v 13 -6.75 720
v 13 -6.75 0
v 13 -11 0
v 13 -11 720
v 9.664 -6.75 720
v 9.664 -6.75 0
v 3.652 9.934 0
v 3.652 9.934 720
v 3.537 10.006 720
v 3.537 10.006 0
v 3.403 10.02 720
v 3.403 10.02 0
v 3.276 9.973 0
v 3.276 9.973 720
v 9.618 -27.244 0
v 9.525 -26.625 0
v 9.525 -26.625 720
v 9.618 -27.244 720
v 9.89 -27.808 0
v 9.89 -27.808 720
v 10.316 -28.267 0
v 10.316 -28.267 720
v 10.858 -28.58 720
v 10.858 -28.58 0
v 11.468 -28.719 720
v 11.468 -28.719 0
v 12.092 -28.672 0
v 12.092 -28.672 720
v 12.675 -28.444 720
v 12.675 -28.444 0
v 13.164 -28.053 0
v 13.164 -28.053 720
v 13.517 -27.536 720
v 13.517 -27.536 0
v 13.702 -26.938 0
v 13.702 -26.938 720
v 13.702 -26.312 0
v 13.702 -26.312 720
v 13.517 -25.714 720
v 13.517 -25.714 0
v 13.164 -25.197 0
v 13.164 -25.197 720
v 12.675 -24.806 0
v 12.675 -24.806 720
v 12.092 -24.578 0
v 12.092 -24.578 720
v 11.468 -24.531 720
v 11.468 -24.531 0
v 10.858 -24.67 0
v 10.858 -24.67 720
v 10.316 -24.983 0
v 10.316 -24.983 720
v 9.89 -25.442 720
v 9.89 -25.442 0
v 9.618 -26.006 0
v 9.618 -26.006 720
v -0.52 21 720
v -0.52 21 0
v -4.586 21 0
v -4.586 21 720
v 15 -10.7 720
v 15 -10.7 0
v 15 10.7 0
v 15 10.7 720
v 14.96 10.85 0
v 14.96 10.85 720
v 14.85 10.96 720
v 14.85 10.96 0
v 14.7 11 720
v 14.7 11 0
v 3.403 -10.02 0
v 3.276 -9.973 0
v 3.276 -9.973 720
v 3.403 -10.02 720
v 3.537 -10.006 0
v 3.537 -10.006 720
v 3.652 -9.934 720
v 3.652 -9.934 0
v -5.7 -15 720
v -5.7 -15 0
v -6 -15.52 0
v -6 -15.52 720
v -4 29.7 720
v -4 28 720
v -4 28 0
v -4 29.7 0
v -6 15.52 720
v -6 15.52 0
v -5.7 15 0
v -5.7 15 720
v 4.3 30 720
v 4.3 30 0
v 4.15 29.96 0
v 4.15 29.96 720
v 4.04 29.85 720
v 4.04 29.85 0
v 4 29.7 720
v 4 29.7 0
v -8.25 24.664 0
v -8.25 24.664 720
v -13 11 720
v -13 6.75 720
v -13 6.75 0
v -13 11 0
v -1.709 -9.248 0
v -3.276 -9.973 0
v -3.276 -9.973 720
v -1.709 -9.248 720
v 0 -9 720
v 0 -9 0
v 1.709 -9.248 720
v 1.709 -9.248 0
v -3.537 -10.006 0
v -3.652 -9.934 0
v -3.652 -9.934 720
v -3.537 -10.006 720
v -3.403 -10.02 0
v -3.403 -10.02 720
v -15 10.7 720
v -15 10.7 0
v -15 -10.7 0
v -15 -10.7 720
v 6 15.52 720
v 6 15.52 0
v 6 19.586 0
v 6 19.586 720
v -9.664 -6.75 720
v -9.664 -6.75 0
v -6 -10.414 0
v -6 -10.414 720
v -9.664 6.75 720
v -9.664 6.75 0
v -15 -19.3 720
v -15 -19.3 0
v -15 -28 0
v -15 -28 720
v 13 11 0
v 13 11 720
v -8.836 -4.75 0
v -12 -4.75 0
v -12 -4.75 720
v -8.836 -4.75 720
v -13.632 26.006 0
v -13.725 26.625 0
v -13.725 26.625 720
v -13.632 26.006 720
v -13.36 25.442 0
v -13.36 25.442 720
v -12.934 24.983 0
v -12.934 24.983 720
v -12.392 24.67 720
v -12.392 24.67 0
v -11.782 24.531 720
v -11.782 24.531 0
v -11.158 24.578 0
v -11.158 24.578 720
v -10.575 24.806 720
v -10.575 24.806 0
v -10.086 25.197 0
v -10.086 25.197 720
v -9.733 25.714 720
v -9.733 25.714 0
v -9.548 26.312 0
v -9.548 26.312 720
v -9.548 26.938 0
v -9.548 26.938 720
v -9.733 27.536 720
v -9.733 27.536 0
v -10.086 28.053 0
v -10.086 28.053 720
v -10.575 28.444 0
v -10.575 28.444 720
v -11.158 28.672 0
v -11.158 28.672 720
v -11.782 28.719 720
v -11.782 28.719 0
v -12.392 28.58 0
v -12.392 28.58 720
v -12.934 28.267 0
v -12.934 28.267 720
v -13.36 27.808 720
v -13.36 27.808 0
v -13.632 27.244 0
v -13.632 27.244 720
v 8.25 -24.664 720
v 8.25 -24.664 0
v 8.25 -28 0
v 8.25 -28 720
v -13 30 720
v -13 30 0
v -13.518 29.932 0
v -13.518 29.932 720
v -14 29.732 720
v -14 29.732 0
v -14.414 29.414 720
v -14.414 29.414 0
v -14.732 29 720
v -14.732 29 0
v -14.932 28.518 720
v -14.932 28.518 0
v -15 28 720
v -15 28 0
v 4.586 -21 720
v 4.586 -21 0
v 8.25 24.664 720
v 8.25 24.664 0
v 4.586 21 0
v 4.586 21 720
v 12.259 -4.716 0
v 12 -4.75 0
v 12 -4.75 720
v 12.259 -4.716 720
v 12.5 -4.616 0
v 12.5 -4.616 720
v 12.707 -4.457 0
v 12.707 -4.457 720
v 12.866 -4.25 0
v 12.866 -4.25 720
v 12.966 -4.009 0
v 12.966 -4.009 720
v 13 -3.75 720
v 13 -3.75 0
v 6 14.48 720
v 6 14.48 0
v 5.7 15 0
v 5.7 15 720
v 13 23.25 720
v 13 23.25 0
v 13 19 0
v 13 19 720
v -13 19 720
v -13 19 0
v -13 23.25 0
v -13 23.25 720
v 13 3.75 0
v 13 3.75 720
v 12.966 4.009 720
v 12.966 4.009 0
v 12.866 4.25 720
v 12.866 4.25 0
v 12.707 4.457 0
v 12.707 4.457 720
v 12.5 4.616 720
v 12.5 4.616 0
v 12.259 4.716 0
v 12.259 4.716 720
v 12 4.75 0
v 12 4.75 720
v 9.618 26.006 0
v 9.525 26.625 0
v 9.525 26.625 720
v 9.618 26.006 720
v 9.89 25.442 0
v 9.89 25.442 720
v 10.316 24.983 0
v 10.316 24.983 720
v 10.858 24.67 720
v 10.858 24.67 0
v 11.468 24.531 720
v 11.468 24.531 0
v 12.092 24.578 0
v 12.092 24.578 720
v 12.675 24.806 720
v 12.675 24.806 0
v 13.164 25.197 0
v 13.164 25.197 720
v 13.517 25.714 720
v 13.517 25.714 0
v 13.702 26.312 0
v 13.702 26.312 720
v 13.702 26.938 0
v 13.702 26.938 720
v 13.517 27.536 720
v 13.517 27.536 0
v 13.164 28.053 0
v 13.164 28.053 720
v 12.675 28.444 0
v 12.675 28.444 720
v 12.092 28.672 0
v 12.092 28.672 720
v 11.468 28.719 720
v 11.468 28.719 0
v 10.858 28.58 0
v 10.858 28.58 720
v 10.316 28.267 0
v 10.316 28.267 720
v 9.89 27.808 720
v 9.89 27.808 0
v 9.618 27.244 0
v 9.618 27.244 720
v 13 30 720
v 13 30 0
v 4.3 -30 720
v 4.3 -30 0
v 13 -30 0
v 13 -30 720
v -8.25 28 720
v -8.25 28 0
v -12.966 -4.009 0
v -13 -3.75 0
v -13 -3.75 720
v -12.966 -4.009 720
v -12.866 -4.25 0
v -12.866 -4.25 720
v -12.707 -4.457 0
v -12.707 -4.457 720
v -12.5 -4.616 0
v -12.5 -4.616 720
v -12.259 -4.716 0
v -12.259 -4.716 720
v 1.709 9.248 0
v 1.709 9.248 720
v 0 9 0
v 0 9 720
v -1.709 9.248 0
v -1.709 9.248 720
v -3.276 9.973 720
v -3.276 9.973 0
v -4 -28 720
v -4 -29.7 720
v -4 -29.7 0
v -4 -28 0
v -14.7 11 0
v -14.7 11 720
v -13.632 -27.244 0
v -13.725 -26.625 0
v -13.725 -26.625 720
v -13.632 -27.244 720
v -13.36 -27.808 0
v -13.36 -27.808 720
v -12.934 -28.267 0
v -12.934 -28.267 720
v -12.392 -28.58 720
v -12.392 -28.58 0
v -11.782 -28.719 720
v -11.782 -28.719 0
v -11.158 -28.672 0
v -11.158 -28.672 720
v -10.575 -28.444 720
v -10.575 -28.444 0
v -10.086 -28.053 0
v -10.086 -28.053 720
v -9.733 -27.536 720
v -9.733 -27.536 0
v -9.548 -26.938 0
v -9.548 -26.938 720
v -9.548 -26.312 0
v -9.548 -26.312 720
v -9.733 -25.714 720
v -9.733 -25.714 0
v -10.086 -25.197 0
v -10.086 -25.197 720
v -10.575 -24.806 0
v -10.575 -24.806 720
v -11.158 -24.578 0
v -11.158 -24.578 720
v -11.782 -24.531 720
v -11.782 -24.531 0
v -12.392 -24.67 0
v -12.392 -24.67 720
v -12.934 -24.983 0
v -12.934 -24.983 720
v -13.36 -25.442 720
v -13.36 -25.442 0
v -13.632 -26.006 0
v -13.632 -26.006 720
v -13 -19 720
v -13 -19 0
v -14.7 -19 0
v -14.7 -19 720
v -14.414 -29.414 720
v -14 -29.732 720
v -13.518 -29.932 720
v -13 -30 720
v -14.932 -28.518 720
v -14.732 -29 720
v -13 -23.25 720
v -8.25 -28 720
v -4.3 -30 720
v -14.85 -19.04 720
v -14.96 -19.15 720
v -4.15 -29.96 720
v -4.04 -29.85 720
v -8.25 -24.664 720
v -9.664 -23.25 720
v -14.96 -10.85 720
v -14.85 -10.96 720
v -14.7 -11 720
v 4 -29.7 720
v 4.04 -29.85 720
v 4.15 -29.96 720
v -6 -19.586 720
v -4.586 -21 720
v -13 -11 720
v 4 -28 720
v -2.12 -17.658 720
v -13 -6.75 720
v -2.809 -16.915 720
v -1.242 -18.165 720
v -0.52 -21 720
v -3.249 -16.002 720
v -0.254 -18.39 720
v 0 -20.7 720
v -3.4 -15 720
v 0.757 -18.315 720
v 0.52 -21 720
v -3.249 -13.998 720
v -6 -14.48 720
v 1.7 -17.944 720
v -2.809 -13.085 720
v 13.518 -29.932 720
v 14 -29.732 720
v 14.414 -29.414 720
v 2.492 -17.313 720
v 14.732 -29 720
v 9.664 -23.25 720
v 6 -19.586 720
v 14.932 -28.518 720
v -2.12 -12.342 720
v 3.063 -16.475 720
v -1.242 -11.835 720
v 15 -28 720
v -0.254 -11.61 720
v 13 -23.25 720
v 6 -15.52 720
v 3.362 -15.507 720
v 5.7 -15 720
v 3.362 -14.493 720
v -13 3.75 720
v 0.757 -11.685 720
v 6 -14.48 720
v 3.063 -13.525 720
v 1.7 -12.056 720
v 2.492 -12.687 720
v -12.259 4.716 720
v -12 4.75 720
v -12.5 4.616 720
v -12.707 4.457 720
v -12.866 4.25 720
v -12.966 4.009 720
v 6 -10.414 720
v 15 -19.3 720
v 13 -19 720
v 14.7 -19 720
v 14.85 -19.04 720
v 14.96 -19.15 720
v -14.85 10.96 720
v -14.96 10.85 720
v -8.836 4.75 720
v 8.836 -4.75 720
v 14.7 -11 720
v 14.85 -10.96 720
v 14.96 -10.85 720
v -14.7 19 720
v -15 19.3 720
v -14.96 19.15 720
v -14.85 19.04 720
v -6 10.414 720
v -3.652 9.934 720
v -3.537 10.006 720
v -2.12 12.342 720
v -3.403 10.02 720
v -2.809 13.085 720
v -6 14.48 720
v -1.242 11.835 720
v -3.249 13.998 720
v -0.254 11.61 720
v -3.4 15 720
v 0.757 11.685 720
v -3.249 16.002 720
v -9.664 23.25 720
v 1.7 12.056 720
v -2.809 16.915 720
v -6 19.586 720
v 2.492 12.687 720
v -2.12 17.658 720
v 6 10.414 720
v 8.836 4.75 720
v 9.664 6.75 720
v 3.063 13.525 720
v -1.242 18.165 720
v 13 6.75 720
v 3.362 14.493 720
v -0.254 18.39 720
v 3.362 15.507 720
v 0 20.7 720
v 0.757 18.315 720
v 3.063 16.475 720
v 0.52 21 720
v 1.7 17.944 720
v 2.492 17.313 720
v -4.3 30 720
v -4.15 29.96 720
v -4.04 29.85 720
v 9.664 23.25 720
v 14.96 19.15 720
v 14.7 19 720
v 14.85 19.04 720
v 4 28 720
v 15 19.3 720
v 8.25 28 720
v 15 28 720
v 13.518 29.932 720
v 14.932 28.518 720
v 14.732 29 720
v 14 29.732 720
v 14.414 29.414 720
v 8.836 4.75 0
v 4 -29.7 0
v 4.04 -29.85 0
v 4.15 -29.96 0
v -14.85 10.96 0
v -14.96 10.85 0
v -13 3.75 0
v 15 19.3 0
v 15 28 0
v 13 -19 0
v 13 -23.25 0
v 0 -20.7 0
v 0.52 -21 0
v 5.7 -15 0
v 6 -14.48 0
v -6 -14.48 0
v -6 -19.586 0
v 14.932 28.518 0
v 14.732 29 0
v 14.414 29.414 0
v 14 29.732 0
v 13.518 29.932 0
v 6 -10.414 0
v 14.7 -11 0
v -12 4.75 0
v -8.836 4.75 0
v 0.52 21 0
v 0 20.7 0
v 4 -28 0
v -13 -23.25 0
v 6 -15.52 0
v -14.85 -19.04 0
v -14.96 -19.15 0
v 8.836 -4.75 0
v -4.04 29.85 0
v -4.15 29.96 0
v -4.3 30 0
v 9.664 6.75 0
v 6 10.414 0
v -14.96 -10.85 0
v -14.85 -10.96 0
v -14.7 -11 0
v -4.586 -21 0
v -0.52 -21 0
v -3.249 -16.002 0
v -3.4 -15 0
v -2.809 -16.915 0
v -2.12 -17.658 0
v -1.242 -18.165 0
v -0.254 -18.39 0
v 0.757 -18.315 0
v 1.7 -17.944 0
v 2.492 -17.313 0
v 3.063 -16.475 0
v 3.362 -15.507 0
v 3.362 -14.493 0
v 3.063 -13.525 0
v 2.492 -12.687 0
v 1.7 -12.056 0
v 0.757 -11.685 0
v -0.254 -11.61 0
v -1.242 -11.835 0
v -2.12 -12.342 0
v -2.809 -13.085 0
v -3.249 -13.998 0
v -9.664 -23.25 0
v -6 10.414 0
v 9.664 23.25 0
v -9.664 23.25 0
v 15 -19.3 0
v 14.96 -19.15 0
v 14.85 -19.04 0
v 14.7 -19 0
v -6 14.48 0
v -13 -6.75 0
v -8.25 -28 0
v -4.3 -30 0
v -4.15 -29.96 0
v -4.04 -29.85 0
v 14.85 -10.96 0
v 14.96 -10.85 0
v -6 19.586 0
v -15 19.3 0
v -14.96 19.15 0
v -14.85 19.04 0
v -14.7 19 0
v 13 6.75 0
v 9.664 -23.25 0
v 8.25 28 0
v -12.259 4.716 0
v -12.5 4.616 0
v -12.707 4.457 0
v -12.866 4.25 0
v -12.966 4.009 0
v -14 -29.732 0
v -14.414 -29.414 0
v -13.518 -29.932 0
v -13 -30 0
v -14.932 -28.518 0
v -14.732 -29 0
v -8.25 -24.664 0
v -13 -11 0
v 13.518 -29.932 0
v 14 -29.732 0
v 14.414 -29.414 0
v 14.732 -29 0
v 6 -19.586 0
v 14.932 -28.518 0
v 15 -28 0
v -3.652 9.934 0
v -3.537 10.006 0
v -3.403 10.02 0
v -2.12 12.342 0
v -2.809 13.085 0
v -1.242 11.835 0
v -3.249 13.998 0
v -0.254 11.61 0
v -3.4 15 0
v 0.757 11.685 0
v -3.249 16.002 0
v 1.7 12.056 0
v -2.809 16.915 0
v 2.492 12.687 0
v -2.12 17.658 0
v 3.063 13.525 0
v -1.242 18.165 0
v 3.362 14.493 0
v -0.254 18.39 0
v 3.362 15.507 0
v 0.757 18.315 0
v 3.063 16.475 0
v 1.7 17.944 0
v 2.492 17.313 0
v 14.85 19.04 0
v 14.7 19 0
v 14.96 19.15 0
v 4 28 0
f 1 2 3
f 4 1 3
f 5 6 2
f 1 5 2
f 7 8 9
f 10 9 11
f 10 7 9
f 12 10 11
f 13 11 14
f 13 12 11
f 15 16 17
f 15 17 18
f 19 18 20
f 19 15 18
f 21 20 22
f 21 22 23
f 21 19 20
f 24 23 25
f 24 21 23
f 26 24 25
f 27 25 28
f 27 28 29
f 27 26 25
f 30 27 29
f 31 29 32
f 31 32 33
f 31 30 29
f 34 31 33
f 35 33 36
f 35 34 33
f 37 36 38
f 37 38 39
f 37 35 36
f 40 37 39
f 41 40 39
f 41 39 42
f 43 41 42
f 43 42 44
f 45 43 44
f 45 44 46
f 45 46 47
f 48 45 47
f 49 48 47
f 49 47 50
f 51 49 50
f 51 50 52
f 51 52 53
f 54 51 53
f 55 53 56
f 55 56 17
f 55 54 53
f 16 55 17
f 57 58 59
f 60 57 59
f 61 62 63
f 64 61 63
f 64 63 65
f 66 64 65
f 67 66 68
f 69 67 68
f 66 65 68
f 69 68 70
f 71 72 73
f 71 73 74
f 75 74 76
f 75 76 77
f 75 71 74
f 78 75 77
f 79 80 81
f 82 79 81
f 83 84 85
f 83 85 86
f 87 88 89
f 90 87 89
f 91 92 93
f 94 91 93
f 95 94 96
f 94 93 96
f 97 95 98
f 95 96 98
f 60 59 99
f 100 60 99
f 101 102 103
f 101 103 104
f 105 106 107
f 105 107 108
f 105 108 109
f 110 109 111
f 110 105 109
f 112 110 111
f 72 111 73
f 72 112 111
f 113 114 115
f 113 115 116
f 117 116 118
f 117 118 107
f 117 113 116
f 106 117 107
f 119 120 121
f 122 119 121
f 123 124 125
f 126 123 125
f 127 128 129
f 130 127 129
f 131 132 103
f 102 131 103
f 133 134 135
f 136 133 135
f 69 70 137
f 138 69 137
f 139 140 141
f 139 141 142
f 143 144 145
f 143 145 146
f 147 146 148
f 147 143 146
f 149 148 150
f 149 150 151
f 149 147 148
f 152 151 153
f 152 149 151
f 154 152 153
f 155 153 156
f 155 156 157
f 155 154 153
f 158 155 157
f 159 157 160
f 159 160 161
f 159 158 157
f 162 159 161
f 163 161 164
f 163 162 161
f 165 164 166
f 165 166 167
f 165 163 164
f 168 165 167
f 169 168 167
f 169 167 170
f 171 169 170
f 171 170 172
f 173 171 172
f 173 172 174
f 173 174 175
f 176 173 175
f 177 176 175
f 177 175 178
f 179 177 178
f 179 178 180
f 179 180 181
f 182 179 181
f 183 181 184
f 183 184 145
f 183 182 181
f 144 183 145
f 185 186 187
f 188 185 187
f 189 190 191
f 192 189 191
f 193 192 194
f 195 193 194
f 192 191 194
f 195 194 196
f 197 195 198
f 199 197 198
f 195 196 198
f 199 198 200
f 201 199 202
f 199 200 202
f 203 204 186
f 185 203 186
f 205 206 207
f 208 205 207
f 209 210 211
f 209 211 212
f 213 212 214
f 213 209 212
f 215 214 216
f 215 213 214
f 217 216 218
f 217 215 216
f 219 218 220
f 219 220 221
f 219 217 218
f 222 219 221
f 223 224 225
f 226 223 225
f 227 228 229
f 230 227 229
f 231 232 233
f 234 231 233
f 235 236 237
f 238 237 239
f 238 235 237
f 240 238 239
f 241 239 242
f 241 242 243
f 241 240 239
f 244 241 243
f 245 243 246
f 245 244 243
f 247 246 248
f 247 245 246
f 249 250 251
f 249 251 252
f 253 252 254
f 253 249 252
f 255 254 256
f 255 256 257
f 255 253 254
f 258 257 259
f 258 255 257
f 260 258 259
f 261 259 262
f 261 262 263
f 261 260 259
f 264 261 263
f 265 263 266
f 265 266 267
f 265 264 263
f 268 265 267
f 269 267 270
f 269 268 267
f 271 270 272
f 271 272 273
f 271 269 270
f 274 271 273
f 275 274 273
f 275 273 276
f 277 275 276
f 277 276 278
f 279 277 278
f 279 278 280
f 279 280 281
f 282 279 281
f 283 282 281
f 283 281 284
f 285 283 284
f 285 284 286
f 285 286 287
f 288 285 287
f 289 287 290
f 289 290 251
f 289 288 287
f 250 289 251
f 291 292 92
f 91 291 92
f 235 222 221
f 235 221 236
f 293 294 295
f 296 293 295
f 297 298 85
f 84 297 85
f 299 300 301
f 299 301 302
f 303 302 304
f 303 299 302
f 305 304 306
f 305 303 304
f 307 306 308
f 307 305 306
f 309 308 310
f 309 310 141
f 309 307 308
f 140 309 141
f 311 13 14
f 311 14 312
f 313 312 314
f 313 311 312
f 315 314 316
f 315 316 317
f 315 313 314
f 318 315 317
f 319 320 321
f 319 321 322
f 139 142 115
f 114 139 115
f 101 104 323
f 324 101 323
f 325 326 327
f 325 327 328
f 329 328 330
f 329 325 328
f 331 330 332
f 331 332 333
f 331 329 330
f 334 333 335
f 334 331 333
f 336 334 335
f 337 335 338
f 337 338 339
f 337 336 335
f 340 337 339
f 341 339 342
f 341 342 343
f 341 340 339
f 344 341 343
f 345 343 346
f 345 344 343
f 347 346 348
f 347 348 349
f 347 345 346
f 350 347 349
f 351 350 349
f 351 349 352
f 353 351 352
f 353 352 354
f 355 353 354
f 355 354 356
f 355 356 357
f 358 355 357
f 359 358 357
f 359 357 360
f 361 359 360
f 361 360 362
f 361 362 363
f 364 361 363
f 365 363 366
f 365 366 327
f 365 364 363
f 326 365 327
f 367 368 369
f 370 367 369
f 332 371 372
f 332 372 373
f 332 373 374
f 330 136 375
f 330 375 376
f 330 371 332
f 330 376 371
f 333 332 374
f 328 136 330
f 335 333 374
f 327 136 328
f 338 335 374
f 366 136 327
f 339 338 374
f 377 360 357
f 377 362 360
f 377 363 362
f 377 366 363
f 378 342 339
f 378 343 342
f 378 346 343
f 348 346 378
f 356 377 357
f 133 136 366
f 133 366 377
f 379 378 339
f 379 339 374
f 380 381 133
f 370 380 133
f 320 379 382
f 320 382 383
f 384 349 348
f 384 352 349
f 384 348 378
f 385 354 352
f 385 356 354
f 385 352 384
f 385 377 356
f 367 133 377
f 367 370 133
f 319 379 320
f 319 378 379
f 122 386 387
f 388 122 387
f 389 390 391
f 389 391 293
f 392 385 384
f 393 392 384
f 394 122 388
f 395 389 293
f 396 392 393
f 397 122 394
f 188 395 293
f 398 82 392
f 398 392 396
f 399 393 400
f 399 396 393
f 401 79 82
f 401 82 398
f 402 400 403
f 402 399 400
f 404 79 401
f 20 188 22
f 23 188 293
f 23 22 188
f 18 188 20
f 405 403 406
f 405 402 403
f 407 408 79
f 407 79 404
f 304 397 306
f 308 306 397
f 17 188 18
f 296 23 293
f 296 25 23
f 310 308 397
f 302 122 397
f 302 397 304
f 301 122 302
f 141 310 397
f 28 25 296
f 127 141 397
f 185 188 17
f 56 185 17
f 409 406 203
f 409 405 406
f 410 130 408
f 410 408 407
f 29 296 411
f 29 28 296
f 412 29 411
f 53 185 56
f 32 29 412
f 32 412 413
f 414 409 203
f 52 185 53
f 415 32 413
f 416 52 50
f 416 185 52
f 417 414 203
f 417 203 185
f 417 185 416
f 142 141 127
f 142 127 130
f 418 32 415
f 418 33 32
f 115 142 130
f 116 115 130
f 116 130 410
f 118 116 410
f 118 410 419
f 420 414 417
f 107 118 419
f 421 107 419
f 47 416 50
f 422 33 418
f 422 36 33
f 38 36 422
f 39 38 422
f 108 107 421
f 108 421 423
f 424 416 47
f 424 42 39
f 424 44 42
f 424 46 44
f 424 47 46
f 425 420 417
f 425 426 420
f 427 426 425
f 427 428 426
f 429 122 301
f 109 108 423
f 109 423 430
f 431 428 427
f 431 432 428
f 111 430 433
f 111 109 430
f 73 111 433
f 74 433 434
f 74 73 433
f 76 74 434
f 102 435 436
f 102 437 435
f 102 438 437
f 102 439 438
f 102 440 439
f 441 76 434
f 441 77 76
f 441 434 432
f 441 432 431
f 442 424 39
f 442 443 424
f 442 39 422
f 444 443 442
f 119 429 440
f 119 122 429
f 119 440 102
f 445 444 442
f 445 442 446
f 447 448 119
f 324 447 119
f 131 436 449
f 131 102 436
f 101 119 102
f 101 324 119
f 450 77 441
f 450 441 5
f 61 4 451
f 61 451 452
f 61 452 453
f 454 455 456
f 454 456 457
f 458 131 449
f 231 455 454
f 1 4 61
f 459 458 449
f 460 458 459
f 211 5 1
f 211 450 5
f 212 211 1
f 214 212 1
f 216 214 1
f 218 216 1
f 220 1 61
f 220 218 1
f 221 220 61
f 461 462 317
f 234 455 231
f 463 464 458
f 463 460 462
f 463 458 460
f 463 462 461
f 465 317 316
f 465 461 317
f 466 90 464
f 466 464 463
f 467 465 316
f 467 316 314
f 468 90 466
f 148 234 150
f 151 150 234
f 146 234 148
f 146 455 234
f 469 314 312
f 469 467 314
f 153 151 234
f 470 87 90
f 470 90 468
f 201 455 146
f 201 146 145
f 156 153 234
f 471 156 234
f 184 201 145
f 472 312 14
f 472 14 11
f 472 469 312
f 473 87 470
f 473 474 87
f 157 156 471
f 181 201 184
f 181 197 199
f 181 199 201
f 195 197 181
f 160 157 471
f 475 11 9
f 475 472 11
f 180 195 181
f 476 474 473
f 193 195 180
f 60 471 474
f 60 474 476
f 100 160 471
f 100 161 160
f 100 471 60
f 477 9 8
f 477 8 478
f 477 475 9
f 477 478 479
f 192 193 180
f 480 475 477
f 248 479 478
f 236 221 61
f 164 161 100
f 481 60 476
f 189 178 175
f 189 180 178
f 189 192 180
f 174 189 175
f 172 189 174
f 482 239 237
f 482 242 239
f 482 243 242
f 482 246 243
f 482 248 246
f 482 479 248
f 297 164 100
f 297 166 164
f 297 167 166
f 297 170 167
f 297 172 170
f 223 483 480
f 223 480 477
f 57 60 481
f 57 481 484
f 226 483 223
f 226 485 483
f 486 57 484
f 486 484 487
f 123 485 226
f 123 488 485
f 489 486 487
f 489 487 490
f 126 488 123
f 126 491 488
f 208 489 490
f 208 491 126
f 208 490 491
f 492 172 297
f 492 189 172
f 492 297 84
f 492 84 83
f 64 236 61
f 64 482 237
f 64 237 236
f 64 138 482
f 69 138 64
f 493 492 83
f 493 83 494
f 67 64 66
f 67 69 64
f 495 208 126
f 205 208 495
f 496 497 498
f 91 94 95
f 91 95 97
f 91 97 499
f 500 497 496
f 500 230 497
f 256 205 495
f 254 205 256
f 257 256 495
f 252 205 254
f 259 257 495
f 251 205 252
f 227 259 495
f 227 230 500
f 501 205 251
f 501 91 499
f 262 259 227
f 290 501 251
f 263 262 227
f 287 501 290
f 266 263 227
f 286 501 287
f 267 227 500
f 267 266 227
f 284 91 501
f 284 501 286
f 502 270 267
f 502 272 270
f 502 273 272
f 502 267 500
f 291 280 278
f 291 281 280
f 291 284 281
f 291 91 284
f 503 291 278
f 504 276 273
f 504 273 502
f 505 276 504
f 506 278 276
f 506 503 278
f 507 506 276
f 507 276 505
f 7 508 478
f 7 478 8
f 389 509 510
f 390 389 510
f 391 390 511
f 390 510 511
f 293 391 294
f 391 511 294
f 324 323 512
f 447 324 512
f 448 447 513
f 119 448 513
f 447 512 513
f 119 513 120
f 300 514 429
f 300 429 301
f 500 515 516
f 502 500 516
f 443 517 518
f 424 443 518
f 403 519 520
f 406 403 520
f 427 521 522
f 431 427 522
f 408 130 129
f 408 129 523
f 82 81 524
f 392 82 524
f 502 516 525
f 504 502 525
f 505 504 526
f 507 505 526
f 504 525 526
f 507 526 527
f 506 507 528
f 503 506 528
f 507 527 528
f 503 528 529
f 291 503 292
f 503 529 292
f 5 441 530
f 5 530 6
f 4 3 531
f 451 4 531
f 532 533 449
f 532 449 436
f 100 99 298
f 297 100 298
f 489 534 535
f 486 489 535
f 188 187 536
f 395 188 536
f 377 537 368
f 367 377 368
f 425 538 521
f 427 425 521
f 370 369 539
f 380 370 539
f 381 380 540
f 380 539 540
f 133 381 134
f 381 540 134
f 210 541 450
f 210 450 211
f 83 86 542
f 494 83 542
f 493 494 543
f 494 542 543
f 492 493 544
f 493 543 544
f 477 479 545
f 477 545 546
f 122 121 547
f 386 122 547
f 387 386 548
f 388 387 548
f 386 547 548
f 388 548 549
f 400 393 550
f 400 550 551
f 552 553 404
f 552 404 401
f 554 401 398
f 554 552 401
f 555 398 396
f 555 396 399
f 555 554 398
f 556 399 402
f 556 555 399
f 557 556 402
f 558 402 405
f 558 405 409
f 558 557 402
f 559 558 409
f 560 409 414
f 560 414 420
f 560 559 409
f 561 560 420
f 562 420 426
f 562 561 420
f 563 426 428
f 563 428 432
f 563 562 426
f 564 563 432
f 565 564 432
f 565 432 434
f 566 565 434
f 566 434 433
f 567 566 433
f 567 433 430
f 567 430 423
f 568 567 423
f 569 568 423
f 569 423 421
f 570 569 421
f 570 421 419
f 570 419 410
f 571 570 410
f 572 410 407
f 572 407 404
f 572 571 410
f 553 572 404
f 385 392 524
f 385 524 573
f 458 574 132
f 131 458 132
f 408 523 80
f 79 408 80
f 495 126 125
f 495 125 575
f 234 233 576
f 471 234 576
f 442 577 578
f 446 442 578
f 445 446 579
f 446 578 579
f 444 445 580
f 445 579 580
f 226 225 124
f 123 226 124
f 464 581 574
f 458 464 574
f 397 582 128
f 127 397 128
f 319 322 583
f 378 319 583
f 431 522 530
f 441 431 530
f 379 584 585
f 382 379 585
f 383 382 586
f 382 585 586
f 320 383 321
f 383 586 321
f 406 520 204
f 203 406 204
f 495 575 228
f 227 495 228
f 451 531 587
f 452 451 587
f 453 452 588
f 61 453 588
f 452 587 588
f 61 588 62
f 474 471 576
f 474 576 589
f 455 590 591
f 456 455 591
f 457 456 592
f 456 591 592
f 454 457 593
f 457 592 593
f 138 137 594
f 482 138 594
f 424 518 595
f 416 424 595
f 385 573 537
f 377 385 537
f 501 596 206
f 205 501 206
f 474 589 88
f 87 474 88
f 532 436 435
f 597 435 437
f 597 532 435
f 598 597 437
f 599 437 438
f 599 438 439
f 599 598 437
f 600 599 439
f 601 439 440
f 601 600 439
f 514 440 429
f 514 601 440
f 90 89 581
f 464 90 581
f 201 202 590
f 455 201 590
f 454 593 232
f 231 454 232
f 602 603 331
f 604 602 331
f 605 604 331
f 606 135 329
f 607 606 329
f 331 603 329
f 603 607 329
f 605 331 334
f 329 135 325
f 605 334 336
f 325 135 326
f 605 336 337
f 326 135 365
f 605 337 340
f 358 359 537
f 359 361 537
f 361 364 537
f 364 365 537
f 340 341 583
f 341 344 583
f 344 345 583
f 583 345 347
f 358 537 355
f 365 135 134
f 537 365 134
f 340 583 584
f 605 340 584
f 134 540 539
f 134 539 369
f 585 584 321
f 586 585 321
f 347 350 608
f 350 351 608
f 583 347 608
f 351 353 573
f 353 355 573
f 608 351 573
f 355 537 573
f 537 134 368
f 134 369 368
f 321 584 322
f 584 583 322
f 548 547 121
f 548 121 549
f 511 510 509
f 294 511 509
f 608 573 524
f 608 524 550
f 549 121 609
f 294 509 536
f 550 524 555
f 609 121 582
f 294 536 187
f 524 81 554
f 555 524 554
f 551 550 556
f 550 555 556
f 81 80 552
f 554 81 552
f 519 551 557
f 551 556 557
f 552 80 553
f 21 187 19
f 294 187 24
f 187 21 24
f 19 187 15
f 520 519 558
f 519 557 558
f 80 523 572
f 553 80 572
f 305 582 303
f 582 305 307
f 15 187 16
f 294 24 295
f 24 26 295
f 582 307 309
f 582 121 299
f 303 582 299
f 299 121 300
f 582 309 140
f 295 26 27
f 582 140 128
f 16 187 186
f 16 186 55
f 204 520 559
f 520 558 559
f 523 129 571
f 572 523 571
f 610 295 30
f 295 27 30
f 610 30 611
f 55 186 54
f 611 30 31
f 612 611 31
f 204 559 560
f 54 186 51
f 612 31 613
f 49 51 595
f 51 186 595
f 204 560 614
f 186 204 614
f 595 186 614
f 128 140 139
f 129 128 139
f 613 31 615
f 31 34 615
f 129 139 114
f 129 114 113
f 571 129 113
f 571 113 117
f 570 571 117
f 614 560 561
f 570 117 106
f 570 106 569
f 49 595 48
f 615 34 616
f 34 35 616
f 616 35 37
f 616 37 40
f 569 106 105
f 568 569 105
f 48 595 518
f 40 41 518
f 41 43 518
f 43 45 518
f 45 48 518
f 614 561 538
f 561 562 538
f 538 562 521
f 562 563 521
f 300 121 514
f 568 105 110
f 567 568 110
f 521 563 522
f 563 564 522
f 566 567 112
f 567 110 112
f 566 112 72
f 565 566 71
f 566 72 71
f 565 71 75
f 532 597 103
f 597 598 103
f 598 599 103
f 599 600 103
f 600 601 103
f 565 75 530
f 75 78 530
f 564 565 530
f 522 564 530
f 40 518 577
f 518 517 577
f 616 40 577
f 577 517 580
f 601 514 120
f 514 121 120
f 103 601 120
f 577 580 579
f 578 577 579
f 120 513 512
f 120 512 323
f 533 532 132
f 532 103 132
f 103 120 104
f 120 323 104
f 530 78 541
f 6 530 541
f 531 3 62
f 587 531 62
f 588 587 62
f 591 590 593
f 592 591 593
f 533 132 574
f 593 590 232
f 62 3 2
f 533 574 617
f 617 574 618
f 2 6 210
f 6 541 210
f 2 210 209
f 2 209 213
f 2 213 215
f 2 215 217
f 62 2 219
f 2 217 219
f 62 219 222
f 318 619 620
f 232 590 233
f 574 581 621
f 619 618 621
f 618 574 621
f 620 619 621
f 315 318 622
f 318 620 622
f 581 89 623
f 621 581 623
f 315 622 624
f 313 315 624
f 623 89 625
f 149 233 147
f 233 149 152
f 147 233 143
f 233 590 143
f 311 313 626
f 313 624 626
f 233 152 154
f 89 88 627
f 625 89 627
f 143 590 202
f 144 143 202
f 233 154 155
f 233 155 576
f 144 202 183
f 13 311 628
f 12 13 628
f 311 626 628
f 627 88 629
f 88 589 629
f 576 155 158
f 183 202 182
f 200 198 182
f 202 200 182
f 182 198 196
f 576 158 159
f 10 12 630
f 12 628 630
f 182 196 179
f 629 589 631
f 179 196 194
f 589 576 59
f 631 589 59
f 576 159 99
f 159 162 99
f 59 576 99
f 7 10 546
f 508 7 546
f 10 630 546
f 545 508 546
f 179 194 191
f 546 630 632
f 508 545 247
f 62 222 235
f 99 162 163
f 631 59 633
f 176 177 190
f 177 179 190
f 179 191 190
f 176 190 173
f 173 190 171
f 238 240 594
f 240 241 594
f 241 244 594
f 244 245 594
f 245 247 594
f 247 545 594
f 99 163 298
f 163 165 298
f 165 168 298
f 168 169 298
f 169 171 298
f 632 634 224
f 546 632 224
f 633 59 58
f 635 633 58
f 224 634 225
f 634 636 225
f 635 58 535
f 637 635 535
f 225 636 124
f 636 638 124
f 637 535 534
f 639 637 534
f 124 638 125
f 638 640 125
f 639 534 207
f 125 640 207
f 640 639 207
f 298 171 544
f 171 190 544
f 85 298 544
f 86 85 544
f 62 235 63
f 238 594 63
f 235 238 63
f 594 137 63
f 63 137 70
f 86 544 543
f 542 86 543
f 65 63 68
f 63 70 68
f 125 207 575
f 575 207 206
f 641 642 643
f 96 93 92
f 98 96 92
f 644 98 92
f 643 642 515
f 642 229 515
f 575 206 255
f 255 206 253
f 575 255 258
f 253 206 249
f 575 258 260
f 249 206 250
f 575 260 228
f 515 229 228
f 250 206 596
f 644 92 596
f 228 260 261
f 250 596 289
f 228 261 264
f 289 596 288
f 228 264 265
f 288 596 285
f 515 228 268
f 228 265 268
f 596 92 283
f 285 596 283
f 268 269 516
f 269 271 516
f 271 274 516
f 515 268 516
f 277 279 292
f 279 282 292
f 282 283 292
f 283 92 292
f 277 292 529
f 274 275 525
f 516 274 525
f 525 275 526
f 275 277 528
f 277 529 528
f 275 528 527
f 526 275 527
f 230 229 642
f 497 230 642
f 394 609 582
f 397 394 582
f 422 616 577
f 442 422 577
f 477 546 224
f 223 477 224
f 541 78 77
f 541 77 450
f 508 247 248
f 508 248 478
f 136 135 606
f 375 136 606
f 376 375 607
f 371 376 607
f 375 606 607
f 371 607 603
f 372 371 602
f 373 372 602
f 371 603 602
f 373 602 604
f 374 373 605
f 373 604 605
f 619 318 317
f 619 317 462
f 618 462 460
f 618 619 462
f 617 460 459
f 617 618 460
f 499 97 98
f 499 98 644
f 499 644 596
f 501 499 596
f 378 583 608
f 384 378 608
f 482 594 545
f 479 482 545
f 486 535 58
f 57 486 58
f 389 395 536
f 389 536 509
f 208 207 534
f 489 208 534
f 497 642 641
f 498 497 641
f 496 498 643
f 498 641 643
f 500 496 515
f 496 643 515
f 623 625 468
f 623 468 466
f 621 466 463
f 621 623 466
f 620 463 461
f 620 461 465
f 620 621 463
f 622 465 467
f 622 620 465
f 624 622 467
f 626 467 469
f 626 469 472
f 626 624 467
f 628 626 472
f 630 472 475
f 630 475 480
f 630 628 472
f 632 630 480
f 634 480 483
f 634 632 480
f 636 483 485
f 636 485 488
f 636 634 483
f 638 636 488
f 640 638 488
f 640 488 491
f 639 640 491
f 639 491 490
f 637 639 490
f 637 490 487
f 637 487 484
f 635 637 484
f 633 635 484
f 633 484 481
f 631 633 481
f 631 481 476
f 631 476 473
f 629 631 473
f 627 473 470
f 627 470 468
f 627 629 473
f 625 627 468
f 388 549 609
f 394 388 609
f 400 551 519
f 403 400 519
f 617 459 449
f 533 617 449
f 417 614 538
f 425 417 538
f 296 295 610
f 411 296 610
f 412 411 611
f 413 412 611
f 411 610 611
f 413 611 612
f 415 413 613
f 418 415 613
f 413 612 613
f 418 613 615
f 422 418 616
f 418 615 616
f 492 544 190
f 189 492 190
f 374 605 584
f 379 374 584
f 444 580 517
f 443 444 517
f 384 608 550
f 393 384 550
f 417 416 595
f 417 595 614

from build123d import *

# Parameters (mm, degrees)
SKETCH2_R           = 2.1
SKETCH2_R_2         = 3.4
BOSS_EXTRUDE1_DEPTH = 720


with BuildPart() as part:
    # Sketch2 → Boss-Extrude1 (new body)
    with BuildSketch(Plane.XY):
        with BuildLine():
            Line((-13, -30), (-4.3, -30))
            ThreePointArc((-4.3, -30), (-4.087867966, -29.912132034), (-4, -29.7))
            Line((-4, -29.7), (-4, -28))
            Line((-4, -28), (-8.249999995, -28))
            Line((-8.249999995, -28), (-8.249999995, -24.664213567))
            Line((-8.249999995, -24.664213567), (-4.585786428, -21))
            Line((-4.585786428, -21), (-0.519615237, -21))
            Line((-0.519615237, -21), (5e-09, -20.7))
            Line((5e-09, -20.7), (0.519615247, -21))
            Line((0.519615247, -21), (4.585786438, -21))
            Line((4.585786438, -21), (8.250000005, -24.664213567))
            Line((8.250000005, -24.664213567), (8.250000005, -28))
            Line((8.250000005, -28), (4, -28))
            Line((4, -28), (4, -29.7))
            ThreePointArc((4, -29.7), (4.087867966, -29.912132034), (4.3, -30))
            Line((4.3, -30), (13, -30))
            ThreePointArc((13, -30), (14.414213562, -29.414213562), (15, -28))
            Line((15, -28), (15, -19.3000023))
            ThreePointArc((15, -19.3000023), (14.912132034, -19.087870266), (14.7, -19.0000023))
            Line((14.7, -19.0000023), (13.000000005, -19.0000023))
            Line((13.000000005, -19.0000023), (13.000000005, -23.250000005))
            Line((13.000000005, -23.250000005), (9.664213567, -23.250000005))
            Line((9.664213567, -23.250000005), (6.000000005, -19.585786443))
            Line((6.000000005, -19.585786443), (6.000000005, -15.519615247))
            Line((6.000000005, -15.519615247), (5.700000005, -15.000000005))
            Line((5.700000005, -15.000000005), (6.000000005, -14.480384763))
            Line((6.000000005, -14.480384763), (6.000000005, -10.414213567))
            Line((6.000000005, -10.414213567), (9.664213567, -6.750000005))
            Line((9.664213567, -6.750000005), (13.000000005, -6.750000005))
            Line((13.000000005, -6.750000005), (13.000000005, -11.0000023))
            Line((13.000000005, -11.0000023), (14.7, -11.0000023))
            ThreePointArc((14.7, -11.0000023), (14.912132034, -10.912134335), (15, -10.7000023))
            Line((15, -10.7000023), (15, 10.7000023))
            ThreePointArc((15, 10.7000023), (14.912132034, 10.912134335), (14.7, 11.0000023))
            Line((14.7, 11.0000023), (13.000000005, 11.0000023))
            Line((13.000000005, 11.0000023), (13.000000005, 6.749999995))
            Line((13.000000005, 6.749999995), (9.664213567, 6.749999995))
            Line((9.664213567, 6.749999995), (6.000000005, 10.414213557))
            Line((6.000000005, 10.414213557), (6.000000005, 14.480384753))
            Line((6.000000005, 14.480384753), (5.700000005, 14.999999995))
            Line((5.700000005, 14.999999995), (6.000000005, 15.519615237))
            Line((6.000000005, 15.519615237), (6.000000005, 19.585786433))
            Line((6.000000005, 19.585786433), (9.664213567, 23.249999995))
            Line((9.664213567, 23.249999995), (13.000000005, 23.249999995))
            Line((13.000000005, 23.249999995), (13.000000005, 19.0000023))
            Line((13.000000005, 19.0000023), (14.7, 19.0000023))
            ThreePointArc((14.7, 19.0000023), (14.912132034, 19.087870266), (15, 19.3000023))
            Line((15, 19.3000023), (15, 28))
            ThreePointArc((15, 28), (14.414213562, 29.414213562), (13, 30))
            Line((13, 30), (4.3, 30))
            ThreePointArc((4.3, 30), (4.087867966, 29.912132034), (4, 29.7))
            Line((4, 29.7), (4, 28))
            Line((4, 28), (8.250000005, 28))
            Line((8.250000005, 28), (8.250000005, 24.664213557))
            Line((8.250000005, 24.664213557), (4.585786448, 21))
            Line((4.585786448, 21), (0.519615247, 21))
            Line((0.519615247, 21), (5e-09, 20.7))
            Line((5e-09, 20.7), (-0.519615237, 21))
            Line((-0.519615237, 21), (-4.585786438, 21))
            Line((-4.585786438, 21), (-8.249999995, 24.664213557))
            Line((-8.249999995, 24.664213557), (-8.249999995, 28))
            Line((-8.249999995, 28), (-4, 28))
            Line((-4, 28), (-4, 29.7))
            ThreePointArc((-4, 29.7), (-4.087867966, 29.912132034), (-4.3, 30))
            Line((-4.3, 30), (-13, 30))
            ThreePointArc((-13, 30), (-14.414213562, 29.414213562), (-15, 28))
            Line((-15, 28), (-15, 19.3000023))
            ThreePointArc((-15, 19.3000023), (-14.912132034, 19.087870266), (-14.7, 19.0000023))
            Line((-14.7, 19.0000023), (-12.999999995, 19.0000023))
            Line((-12.999999995, 19.0000023), (-12.999999995, 23.249999995))
            Line((-12.999999995, 23.249999995), (-9.664213557, 23.249999995))
            Line((-9.664213557, 23.249999995), (-5.999999995, 19.585786433))
            Line((-5.999999995, 19.585786433), (-5.999999995, 15.519615237))
            Line((-5.999999995, 15.519615237), (-5.699999995, 14.999999995))
            Line((-5.699999995, 14.999999995), (-5.999999995, 14.480384753))
            Line((-5.999999995, 14.480384753), (-5.999999995, 10.414213557))
            Line((-5.999999995, 10.414213557), (-9.664213557, 6.749999995))
            Line((-9.664213557, 6.749999995), (-12.999999995, 6.749999995))
            Line((-12.999999995, 6.749999995), (-12.999999995, 11.0000023))
            Line((-12.999999995, 11.0000023), (-14.7, 11.0000023))
            ThreePointArc((-14.7, 11.0000023), (-14.912132034, 10.912134335), (-15, 10.7000023))
            Line((-15, 10.7000023), (-15, -10.7000023))
            ThreePointArc((-15, -10.7000023), (-14.912132034, -10.912134335), (-14.7, -11.0000023))
            Line((-14.7, -11.0000023), (-12.999999995, -11.0000023))
            Line((-12.999999995, -11.0000023), (-12.999999995, -6.750000005))
            Line((-12.999999995, -6.750000005), (-9.664213557, -6.750000005))
            Line((-9.664213557, -6.750000005), (-5.999999995, -10.414213567))
            Line((-5.999999995, -10.414213567), (-5.999999995, -14.480384763))
            Line((-5.999999995, -14.480384763), (-5.699999995, -15.000000005))
            Line((-5.699999995, -15.000000005), (-5.999999995, -15.519615247))
            Line((-5.999999995, -15.519615247), (-5.999999995, -19.585786443))
            Line((-5.999999995, -19.585786443), (-9.664213557, -23.250000005))
            Line((-9.664213557, -23.250000005), (-12.999999995, -23.250000005))
            Line((-12.999999995, -23.250000005), (-12.999999995, -19.0000023))
            Line((-12.999999995, -19.0000023), (-14.7, -19.0000023))
            ThreePointArc((-14.7, -19.0000023), (-14.912132034, -19.087870266), (-15, -19.3000023))
            Line((-15, -19.3000023), (-15, -28))
            ThreePointArc((-15, -28), (-14.414213562, -29.414213562), (-13, -30))
        make_face()
        with Locations(Location((11.625000005, 26.624999995, 0), (0, 0, 180))):
            Circle(SKETCH2_R, mode=Mode.SUBTRACT)
        with Locations(Location((11.625000005, -26.625000005, 0), (0, 0, 180))):
            Circle(SKETCH2_R, mode=Mode.SUBTRACT)
        with Locations(Location((4.55e-07, -15.00000049, 0), (0, 0, 180))):
            Circle(SKETCH2_R_2, mode=Mode.SUBTRACT)
        with Locations(Location((4.55e-07, 15.0000023, 0), (0, 0, 180))):
            Circle(SKETCH2_R_2, mode=Mode.SUBTRACT)
        with Locations(Location((-11.624999995, 26.624999995, 0), (0, 0, 180))):
            Circle(SKETCH2_R, mode=Mode.SUBTRACT)
        with Locations(Location((-11.624999995, -26.625000005, 0), (0, 0, 180))):
            Circle(SKETCH2_R, mode=Mode.SUBTRACT)
        with BuildLine():
            Line((-12.999999995, 3.749999995), (-12.999999995, -3.750000005))
            ThreePointArc((-12.999999995, -3.750000005), (-12.707106776, -4.457106786), (-11.999999995, -4.750000005))
            Line((-11.999999995, -4.750000005), (-8.835786433, -4.750000005))
            Line((-8.835786433, -4.750000005), (-3.651790591, -9.933995846))
            ThreePointArc((-3.651790591, -9.933995846), (-3.470778838, -10.020245326), (-3.275865231, -9.973203714))
            ThreePointArc((-3.275865231, -9.973203714), (1.45e-07, -9.000002005), (3.275865622, -9.973203376))
            ThreePointArc((3.275865622, -9.973203376), (3.470779219, -10.02024497), (3.651790956, -9.933995491))
            Line((3.651790956, -9.933995491), (8.835786443, -4.750000005))
            Line((8.835786443, -4.750000005), (12.000000005, -4.750000005))
            ThreePointArc((12.000000005, -4.750000005), (12.707106786, -4.457106786), (13.000000005, -3.750000005))
            Line((13.000000005, -3.750000005), (13.000000005, 3.749999995))
            ThreePointArc((13.000000005, 3.749999995), (12.707106786, 4.457106776), (12.000000005, 4.749999995))
            Line((12.000000005, 4.749999995), (8.835786443, 4.749999995))
            Line((8.835786443, 4.749999995), (3.6517913, 9.933995138))
            ThreePointArc((3.6517913, 9.933995138), (3.470779584, 10.020244614), (3.275866001, 9.973203046))
            ThreePointArc((3.275866001, 9.973203046), (1.45e-07, 9.000001815), (-3.27586561, 9.973203384))
            ThreePointArc((-3.27586561, 9.973203384), (-3.470779203, 10.020244971), (-3.651790935, 9.933995493))
            Line((-3.651790935, 9.933995493), (-8.835786433, 4.749999995))
            Line((-8.835786433, 4.749999995), (-11.999999995, 4.749999995))
            ThreePointArc((-11.999999995, 4.749999995), (-12.707106776, 4.457106776), (-12.999999995, 3.749999995))
        make_face(mode=Mode.SUBTRACT)
    extrude(amount=BOSS_EXTRUDE1_DEPTH)


solid = part.part
